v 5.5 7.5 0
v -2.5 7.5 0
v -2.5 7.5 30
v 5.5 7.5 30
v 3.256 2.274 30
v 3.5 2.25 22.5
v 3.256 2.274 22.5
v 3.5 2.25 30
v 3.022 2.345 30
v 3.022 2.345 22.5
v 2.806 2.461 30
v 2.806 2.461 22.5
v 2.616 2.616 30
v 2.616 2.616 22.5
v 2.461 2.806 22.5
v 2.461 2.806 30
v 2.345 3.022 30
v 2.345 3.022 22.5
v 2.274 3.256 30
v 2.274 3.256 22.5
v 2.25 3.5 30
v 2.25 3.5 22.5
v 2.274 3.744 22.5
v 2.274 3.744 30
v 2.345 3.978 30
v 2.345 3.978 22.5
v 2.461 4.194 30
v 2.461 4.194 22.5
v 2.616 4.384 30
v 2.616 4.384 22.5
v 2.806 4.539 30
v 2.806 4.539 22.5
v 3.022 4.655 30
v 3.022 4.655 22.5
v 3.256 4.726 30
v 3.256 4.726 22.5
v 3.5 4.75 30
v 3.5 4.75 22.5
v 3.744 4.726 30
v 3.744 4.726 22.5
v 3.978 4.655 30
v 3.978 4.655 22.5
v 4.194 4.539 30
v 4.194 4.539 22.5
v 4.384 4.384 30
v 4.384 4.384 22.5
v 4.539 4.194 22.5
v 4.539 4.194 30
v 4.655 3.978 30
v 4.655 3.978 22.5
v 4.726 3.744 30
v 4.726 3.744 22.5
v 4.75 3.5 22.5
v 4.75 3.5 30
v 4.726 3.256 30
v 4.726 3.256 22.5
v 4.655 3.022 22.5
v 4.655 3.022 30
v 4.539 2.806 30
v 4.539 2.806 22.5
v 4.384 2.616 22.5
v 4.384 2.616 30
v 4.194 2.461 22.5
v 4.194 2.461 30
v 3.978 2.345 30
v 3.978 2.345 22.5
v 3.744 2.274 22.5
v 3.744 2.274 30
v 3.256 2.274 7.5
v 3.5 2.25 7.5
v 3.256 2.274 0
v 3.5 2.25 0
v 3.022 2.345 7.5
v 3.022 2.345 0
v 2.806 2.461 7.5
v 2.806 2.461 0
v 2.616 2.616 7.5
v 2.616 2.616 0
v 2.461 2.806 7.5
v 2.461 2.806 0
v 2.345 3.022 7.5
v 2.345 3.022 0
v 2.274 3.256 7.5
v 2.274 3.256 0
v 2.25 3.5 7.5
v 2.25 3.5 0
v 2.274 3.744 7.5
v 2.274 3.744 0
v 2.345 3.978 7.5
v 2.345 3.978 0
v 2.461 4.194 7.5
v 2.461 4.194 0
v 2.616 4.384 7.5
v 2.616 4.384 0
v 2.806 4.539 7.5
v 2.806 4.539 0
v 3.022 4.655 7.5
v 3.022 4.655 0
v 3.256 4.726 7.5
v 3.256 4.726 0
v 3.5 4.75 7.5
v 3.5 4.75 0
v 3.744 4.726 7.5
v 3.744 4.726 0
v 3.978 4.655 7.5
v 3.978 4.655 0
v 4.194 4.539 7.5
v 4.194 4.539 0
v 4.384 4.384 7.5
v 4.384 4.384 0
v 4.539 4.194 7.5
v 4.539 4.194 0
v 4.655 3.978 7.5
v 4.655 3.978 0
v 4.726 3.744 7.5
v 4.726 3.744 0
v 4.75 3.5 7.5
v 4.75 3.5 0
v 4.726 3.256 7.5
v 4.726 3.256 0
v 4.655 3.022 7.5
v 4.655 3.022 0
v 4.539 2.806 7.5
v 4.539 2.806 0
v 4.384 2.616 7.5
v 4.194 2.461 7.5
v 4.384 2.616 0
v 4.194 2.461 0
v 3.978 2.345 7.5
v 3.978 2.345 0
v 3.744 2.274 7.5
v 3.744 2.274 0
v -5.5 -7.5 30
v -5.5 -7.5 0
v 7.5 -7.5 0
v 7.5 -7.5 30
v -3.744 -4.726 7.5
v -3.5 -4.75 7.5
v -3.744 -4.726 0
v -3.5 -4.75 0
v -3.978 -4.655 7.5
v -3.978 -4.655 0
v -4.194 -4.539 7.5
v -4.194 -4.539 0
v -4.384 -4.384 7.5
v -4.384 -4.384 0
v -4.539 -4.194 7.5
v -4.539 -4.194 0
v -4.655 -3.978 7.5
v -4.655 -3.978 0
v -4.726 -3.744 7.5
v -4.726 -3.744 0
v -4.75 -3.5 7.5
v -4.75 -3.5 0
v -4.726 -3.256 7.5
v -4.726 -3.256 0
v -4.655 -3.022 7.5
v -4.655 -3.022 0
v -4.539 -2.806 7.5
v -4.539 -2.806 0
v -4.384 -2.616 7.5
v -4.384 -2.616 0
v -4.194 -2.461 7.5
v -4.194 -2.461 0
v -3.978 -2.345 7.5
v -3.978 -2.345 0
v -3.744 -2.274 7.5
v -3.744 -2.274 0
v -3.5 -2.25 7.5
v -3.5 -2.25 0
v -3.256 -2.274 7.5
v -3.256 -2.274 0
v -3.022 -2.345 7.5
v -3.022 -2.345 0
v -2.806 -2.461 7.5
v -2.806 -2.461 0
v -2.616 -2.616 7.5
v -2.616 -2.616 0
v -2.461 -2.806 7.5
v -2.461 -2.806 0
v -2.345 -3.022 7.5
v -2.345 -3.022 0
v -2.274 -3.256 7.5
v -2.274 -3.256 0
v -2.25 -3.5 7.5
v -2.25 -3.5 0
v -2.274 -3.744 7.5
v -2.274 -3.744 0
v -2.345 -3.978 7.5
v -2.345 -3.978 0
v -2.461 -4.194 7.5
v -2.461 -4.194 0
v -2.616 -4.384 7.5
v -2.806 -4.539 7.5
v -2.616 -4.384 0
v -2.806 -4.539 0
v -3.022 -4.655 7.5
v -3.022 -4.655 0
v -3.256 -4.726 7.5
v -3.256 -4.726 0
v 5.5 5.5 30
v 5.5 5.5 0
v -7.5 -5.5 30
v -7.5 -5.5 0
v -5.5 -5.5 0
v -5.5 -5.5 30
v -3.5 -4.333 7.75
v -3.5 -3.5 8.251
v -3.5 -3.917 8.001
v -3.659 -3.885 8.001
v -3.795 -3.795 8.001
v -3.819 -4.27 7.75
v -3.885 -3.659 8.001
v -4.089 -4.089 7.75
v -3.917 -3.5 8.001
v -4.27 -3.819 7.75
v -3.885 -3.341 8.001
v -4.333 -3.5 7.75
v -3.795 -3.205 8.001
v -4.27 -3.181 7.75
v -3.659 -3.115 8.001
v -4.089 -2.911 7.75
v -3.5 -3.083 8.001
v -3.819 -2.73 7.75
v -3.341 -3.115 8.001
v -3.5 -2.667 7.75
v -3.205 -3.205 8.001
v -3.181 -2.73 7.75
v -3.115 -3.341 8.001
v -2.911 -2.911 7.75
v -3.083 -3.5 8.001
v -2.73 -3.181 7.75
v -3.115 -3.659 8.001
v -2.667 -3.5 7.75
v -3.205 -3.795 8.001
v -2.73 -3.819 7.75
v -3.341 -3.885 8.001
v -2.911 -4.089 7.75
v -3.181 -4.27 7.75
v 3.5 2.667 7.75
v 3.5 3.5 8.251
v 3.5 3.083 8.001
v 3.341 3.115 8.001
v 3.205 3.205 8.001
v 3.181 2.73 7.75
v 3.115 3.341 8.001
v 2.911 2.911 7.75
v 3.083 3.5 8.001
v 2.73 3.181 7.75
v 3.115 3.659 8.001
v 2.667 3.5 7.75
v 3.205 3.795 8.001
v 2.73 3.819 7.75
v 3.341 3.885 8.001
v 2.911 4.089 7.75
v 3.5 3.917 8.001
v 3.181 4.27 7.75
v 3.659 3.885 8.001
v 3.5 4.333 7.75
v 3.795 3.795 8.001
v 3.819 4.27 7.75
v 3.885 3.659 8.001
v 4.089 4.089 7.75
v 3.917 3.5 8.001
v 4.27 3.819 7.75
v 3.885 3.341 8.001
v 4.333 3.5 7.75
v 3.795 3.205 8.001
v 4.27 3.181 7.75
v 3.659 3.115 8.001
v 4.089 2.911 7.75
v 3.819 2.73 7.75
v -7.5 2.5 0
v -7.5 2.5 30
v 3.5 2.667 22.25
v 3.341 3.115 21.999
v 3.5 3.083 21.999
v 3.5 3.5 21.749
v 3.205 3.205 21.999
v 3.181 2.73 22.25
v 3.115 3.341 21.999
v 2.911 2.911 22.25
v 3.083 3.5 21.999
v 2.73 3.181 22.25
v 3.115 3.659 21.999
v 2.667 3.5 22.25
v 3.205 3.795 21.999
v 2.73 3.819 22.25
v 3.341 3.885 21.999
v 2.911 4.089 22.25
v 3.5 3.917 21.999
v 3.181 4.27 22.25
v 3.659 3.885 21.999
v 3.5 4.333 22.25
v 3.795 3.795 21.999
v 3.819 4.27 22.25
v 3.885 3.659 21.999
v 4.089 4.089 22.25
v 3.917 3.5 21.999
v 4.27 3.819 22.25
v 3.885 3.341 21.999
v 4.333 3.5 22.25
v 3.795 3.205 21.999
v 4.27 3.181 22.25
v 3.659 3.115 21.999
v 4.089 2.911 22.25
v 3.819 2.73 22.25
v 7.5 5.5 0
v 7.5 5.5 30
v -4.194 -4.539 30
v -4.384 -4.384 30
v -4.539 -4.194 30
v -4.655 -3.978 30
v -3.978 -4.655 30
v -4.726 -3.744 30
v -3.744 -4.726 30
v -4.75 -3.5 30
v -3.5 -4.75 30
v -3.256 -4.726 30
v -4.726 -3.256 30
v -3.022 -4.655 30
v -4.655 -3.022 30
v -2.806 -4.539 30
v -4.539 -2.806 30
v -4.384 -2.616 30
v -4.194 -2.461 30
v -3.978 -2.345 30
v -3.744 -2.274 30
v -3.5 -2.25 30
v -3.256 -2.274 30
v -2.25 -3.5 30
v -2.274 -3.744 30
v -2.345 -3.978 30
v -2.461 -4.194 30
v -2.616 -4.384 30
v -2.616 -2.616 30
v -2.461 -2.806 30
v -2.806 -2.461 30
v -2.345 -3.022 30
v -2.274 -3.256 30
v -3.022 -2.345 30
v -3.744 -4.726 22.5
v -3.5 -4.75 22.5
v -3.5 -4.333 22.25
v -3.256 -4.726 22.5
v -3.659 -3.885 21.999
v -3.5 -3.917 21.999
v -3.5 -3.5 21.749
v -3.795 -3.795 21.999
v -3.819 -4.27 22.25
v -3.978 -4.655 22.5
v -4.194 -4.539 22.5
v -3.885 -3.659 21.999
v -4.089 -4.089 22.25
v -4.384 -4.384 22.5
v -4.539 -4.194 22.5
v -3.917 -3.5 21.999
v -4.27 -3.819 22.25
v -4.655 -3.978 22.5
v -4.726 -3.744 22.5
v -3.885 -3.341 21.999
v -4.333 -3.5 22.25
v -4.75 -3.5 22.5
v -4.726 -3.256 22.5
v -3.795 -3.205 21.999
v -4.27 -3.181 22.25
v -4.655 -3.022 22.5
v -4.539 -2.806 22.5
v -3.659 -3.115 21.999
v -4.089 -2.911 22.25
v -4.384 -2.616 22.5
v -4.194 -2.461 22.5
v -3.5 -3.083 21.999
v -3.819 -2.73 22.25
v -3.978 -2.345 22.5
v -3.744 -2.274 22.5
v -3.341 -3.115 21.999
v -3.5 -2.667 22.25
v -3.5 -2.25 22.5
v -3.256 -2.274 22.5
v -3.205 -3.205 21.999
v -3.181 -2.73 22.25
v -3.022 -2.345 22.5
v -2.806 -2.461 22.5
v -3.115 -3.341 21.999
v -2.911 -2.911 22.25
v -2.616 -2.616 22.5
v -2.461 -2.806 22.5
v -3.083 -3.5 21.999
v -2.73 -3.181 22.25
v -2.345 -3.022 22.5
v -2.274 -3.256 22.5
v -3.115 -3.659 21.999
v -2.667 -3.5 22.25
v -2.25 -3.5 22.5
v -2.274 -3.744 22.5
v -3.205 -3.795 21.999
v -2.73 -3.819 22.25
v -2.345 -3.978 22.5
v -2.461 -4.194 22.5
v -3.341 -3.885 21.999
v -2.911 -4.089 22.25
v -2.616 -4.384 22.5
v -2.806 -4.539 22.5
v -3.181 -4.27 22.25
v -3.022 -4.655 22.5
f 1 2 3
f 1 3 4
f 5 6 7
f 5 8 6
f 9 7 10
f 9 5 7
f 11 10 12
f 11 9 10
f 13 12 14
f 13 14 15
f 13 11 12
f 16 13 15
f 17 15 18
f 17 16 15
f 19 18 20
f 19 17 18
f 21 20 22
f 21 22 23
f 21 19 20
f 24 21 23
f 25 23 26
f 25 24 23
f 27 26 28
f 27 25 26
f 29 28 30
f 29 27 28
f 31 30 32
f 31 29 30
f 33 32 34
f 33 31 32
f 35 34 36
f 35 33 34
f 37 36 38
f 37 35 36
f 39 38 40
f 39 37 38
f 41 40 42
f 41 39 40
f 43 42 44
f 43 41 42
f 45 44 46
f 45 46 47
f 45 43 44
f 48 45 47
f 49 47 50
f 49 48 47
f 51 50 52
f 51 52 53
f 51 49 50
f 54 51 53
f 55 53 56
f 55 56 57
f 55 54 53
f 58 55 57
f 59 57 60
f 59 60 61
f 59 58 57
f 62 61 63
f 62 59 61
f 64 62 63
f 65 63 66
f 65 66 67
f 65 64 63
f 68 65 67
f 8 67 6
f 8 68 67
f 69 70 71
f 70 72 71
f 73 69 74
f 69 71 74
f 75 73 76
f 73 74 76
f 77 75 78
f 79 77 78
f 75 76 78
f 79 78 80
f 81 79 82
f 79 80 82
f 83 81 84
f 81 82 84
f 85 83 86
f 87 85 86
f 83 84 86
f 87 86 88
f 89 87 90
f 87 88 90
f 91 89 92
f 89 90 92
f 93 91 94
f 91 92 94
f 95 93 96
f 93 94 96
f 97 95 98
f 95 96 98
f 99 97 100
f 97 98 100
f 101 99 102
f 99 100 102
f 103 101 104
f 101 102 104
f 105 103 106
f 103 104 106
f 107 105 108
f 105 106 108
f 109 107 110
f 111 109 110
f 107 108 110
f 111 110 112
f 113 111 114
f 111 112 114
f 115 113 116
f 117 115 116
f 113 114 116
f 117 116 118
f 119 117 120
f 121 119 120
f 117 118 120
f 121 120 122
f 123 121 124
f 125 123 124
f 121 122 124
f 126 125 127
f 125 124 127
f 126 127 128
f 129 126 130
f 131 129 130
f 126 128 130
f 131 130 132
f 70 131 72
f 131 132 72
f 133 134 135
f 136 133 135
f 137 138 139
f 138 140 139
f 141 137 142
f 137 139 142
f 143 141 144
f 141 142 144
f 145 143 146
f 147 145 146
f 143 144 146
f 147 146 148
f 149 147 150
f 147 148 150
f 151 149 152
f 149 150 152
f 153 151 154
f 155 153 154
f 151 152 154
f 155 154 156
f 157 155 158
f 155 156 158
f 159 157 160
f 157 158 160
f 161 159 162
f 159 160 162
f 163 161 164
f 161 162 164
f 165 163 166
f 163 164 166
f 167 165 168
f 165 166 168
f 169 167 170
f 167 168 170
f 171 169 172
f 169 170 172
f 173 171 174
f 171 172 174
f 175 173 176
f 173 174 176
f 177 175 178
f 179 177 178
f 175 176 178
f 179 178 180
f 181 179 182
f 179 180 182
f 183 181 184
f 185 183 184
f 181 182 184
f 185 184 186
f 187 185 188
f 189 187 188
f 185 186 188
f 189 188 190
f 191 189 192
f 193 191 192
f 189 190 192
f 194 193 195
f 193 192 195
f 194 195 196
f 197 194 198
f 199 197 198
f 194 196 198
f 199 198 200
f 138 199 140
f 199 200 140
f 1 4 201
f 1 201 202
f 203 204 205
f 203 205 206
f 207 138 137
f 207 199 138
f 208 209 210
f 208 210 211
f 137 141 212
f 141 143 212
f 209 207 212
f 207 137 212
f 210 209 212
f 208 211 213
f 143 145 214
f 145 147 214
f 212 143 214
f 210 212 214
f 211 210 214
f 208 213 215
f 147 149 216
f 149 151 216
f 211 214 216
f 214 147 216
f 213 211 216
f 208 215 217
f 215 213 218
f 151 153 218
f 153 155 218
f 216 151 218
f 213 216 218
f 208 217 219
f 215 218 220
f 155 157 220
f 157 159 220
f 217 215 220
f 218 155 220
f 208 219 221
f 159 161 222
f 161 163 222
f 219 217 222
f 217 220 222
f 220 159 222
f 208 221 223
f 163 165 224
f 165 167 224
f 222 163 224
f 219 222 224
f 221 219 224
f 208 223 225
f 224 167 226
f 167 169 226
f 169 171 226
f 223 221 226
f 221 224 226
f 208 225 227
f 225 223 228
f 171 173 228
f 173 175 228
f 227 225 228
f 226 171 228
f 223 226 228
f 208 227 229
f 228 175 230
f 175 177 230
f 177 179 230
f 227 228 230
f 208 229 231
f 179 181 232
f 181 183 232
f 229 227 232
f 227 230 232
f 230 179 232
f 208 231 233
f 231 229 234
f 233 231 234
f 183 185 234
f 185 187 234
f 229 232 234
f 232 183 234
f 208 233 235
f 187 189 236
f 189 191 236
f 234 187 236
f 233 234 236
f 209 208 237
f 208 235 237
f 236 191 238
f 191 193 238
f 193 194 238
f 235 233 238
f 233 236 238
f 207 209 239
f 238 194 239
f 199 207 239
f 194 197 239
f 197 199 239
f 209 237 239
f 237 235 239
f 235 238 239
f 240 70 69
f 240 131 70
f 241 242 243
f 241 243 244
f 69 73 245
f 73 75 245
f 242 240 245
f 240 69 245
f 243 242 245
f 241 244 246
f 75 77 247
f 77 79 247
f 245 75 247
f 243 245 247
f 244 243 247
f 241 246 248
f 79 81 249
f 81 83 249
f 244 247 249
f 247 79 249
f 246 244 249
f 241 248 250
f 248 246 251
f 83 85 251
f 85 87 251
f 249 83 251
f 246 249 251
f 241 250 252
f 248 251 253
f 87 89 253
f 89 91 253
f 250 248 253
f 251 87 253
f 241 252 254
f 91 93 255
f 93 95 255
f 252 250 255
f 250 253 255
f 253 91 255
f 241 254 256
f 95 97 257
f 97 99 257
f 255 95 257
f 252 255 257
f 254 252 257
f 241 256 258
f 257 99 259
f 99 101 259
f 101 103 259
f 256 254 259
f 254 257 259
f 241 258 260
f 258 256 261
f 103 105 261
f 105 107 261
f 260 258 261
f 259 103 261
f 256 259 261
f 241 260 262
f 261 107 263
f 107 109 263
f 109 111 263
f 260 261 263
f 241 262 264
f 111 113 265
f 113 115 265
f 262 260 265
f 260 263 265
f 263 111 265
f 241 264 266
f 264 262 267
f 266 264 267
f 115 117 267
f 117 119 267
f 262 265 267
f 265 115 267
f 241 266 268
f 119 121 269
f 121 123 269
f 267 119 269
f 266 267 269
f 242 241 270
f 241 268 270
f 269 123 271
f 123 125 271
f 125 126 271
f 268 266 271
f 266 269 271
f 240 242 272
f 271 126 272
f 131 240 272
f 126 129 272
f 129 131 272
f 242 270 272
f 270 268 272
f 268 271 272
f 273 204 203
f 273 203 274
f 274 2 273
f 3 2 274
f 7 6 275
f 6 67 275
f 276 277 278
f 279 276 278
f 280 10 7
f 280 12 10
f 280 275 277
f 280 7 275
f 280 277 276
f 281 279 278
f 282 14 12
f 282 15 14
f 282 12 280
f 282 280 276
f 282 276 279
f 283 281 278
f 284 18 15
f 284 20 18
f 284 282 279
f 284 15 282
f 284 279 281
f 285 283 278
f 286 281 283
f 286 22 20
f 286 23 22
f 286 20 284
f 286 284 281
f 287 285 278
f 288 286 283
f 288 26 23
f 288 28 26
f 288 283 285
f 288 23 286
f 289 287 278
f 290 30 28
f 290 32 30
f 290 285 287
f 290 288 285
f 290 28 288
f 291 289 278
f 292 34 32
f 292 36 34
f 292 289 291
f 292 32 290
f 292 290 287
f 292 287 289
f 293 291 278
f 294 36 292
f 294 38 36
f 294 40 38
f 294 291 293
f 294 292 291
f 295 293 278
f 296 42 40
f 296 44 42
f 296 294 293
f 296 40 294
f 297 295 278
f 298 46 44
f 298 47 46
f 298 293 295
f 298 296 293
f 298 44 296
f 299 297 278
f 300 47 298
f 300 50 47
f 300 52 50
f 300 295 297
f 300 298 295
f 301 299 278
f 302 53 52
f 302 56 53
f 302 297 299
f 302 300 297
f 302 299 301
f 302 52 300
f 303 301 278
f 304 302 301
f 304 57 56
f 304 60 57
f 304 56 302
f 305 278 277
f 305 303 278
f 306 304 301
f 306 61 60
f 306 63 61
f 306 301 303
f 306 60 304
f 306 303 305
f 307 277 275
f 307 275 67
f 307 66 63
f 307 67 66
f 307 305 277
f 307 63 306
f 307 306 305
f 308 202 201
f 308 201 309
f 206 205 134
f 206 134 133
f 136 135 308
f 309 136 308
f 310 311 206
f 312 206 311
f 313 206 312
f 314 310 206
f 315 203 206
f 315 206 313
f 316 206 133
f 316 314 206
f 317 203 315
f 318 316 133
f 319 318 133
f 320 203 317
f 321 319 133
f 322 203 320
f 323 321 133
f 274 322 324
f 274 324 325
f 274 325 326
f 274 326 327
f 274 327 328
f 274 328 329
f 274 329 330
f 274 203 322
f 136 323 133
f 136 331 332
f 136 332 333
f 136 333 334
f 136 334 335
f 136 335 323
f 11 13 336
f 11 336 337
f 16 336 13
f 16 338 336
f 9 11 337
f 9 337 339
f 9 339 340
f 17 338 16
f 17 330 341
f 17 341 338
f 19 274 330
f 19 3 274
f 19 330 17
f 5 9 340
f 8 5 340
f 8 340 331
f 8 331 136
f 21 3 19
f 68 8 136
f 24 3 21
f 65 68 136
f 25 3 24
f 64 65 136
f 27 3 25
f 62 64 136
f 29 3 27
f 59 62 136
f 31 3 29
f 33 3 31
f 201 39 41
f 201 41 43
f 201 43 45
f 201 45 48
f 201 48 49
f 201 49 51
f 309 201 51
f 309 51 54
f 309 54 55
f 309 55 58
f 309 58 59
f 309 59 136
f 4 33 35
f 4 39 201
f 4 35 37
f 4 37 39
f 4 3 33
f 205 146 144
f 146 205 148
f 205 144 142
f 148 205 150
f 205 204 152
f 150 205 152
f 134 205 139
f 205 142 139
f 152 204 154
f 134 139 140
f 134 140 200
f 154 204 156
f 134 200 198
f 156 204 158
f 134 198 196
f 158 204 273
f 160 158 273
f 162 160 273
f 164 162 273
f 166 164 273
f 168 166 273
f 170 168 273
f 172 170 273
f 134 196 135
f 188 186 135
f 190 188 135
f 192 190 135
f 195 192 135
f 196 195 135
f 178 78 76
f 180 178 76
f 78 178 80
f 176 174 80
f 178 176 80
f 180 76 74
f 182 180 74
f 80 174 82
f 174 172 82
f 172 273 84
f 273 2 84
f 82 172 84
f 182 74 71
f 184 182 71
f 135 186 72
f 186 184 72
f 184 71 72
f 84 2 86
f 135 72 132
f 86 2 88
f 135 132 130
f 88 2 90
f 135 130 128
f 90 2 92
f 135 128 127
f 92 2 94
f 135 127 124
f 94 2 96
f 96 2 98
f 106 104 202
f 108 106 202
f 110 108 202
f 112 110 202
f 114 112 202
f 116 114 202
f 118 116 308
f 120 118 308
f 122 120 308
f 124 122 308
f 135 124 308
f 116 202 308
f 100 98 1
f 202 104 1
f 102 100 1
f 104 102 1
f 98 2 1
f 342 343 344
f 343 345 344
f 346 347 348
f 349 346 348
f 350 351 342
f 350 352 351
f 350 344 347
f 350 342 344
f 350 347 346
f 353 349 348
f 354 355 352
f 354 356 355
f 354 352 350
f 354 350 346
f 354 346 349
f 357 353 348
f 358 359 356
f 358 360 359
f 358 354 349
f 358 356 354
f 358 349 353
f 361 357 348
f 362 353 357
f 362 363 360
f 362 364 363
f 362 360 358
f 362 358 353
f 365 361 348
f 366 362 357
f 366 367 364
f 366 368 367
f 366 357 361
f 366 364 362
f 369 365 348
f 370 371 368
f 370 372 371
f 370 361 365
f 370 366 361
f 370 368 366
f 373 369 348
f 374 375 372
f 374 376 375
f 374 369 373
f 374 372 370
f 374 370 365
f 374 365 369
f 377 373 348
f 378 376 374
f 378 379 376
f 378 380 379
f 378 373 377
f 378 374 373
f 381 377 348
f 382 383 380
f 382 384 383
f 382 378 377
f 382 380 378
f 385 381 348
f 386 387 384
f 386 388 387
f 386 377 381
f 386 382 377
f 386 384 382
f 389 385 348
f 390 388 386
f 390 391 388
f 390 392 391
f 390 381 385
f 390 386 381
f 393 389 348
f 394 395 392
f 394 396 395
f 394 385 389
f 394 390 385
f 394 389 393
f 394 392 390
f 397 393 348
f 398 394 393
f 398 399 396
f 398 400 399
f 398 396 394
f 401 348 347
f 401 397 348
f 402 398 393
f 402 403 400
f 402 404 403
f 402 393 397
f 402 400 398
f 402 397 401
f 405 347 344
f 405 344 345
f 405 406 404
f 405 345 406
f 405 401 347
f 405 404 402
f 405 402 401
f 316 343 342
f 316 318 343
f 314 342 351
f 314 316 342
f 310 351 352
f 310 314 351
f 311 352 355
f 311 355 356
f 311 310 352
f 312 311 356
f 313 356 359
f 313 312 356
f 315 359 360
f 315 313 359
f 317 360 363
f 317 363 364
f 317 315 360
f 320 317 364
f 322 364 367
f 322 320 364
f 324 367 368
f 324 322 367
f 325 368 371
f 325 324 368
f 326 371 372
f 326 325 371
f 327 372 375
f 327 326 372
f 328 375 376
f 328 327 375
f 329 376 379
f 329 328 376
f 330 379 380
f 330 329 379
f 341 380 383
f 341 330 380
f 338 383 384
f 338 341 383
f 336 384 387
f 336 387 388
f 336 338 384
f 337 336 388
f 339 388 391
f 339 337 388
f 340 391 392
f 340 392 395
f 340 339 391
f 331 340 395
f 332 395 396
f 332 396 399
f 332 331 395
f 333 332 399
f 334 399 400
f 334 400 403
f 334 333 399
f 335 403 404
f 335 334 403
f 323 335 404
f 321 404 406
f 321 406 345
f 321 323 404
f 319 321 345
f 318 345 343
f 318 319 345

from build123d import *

# Parameters (mm, degrees)
SKETCH_1_W                  = 15
SKETCH_1_H                  = 15
EXTRUDE_1_DEPTH             = 30
CHAMFER_1_SIZE              = 5
HOLE_WIZARD_M3_2_AT_2_COUNT = 2
HOLE_WIZARD_M3_2_AT_2_PITCH = 9.899494937
SKETCH_5_W                  = 2
SKETCH_5_H                  = 30
CUT_EXTRUDE_1_DEPTH         = 2
SKETCH_6_W                  = 30
SKETCH_6_H                  = 2
CUT_EXTRUDE_2_DEPTH         = 2


with BuildPart() as part:
    # 草图1 → 凸台-拉伸1 (new body)
    with BuildSketch(Plane.XY):
        Rectangle(SKETCH_1_W, SKETCH_1_H)
    extrude(amount=EXTRUDE_1_DEPTH)

    # 倒角1
    chamfer_1_edges = [part.edges().sort_by_distance(p)[0] for p in [
        (-7.5, 7.5, 15),
    ]]
    chamfer(chamfer_1_edges, length=CHAMFER_1_SIZE)

    # 草图3 → M3 螺纹孔2 (revolve, cut)
    with BuildSketch(Plane(origin=(-3.5, -3.5, 30), x_dir=(0, -1, 0), z_dir=(1, 0, 0))):
        Polygon((0, 0), (0, 8.251075774), (1.25, 7.5), (1.25, 0), align=None)
    hole_wizard_m3_2 = revolve(axis=Axis((-3.5, -3.5, 36.35), (0, 0, -1)), mode=Mode.SUBTRACT)

    # M3 螺纹孔2 at 2: M3 螺纹孔2 ×2
    with Locations(*[Vector(0.707106781, 0.707106781, 0) * (i * HOLE_WIZARD_M3_2_AT_2_PITCH) for i in range(1, HOLE_WIZARD_M3_2_AT_2_COUNT)]):
        add(hole_wizard_m3_2, mode=Mode.SUBTRACT)

    # 镜向1: M3 螺纹孔2 across plane
    add(hole_wizard_m3_2.mirror(Plane(origin=(0, 0, 15), x_dir=(1, 0, 0), z_dir=(0, 0, -1))), mode=Mode.SUBTRACT)

    # 镜向1 copy 1 sketch → 镜向1 copy 1 (revolve, cut)
    with BuildSketch(Plane(origin=(3.5, 3.5, 0), x_dir=(0, -1, 0), z_dir=(1, 0, 0))):
        Polygon((0, 0), (0, -8.251075774), (1.25, -7.5), (1.25, 0), align=None)
    revolve(axis=Axis((3.5, 3.5, -6.35), (0, 0, -1)), mode=Mode.SUBTRACT)

    # 草图5 → 切除-拉伸1 (cut)
    with BuildSketch(Plane(origin=(0, 7.5, 0), x_dir=(1, 0, 0), z_dir=(0, 1, 0))):
        with Locations((6.5, -15)):
            Rectangle(SKETCH_5_W, SKETCH_5_H)
    extrude(amount=-CUT_EXTRUDE_1_DEPTH, mode=Mode.SUBTRACT)

    # 草图6 → 切除-拉伸2 (cut)
    with BuildSketch(Plane.ZY.offset(7.5)):
        with Locations((15, -6.5)):
            Rectangle(SKETCH_6_W, SKETCH_6_H)
    extrude(amount=-CUT_EXTRUDE_2_DEPTH, mode=Mode.SUBTRACT)


solid = part.part
